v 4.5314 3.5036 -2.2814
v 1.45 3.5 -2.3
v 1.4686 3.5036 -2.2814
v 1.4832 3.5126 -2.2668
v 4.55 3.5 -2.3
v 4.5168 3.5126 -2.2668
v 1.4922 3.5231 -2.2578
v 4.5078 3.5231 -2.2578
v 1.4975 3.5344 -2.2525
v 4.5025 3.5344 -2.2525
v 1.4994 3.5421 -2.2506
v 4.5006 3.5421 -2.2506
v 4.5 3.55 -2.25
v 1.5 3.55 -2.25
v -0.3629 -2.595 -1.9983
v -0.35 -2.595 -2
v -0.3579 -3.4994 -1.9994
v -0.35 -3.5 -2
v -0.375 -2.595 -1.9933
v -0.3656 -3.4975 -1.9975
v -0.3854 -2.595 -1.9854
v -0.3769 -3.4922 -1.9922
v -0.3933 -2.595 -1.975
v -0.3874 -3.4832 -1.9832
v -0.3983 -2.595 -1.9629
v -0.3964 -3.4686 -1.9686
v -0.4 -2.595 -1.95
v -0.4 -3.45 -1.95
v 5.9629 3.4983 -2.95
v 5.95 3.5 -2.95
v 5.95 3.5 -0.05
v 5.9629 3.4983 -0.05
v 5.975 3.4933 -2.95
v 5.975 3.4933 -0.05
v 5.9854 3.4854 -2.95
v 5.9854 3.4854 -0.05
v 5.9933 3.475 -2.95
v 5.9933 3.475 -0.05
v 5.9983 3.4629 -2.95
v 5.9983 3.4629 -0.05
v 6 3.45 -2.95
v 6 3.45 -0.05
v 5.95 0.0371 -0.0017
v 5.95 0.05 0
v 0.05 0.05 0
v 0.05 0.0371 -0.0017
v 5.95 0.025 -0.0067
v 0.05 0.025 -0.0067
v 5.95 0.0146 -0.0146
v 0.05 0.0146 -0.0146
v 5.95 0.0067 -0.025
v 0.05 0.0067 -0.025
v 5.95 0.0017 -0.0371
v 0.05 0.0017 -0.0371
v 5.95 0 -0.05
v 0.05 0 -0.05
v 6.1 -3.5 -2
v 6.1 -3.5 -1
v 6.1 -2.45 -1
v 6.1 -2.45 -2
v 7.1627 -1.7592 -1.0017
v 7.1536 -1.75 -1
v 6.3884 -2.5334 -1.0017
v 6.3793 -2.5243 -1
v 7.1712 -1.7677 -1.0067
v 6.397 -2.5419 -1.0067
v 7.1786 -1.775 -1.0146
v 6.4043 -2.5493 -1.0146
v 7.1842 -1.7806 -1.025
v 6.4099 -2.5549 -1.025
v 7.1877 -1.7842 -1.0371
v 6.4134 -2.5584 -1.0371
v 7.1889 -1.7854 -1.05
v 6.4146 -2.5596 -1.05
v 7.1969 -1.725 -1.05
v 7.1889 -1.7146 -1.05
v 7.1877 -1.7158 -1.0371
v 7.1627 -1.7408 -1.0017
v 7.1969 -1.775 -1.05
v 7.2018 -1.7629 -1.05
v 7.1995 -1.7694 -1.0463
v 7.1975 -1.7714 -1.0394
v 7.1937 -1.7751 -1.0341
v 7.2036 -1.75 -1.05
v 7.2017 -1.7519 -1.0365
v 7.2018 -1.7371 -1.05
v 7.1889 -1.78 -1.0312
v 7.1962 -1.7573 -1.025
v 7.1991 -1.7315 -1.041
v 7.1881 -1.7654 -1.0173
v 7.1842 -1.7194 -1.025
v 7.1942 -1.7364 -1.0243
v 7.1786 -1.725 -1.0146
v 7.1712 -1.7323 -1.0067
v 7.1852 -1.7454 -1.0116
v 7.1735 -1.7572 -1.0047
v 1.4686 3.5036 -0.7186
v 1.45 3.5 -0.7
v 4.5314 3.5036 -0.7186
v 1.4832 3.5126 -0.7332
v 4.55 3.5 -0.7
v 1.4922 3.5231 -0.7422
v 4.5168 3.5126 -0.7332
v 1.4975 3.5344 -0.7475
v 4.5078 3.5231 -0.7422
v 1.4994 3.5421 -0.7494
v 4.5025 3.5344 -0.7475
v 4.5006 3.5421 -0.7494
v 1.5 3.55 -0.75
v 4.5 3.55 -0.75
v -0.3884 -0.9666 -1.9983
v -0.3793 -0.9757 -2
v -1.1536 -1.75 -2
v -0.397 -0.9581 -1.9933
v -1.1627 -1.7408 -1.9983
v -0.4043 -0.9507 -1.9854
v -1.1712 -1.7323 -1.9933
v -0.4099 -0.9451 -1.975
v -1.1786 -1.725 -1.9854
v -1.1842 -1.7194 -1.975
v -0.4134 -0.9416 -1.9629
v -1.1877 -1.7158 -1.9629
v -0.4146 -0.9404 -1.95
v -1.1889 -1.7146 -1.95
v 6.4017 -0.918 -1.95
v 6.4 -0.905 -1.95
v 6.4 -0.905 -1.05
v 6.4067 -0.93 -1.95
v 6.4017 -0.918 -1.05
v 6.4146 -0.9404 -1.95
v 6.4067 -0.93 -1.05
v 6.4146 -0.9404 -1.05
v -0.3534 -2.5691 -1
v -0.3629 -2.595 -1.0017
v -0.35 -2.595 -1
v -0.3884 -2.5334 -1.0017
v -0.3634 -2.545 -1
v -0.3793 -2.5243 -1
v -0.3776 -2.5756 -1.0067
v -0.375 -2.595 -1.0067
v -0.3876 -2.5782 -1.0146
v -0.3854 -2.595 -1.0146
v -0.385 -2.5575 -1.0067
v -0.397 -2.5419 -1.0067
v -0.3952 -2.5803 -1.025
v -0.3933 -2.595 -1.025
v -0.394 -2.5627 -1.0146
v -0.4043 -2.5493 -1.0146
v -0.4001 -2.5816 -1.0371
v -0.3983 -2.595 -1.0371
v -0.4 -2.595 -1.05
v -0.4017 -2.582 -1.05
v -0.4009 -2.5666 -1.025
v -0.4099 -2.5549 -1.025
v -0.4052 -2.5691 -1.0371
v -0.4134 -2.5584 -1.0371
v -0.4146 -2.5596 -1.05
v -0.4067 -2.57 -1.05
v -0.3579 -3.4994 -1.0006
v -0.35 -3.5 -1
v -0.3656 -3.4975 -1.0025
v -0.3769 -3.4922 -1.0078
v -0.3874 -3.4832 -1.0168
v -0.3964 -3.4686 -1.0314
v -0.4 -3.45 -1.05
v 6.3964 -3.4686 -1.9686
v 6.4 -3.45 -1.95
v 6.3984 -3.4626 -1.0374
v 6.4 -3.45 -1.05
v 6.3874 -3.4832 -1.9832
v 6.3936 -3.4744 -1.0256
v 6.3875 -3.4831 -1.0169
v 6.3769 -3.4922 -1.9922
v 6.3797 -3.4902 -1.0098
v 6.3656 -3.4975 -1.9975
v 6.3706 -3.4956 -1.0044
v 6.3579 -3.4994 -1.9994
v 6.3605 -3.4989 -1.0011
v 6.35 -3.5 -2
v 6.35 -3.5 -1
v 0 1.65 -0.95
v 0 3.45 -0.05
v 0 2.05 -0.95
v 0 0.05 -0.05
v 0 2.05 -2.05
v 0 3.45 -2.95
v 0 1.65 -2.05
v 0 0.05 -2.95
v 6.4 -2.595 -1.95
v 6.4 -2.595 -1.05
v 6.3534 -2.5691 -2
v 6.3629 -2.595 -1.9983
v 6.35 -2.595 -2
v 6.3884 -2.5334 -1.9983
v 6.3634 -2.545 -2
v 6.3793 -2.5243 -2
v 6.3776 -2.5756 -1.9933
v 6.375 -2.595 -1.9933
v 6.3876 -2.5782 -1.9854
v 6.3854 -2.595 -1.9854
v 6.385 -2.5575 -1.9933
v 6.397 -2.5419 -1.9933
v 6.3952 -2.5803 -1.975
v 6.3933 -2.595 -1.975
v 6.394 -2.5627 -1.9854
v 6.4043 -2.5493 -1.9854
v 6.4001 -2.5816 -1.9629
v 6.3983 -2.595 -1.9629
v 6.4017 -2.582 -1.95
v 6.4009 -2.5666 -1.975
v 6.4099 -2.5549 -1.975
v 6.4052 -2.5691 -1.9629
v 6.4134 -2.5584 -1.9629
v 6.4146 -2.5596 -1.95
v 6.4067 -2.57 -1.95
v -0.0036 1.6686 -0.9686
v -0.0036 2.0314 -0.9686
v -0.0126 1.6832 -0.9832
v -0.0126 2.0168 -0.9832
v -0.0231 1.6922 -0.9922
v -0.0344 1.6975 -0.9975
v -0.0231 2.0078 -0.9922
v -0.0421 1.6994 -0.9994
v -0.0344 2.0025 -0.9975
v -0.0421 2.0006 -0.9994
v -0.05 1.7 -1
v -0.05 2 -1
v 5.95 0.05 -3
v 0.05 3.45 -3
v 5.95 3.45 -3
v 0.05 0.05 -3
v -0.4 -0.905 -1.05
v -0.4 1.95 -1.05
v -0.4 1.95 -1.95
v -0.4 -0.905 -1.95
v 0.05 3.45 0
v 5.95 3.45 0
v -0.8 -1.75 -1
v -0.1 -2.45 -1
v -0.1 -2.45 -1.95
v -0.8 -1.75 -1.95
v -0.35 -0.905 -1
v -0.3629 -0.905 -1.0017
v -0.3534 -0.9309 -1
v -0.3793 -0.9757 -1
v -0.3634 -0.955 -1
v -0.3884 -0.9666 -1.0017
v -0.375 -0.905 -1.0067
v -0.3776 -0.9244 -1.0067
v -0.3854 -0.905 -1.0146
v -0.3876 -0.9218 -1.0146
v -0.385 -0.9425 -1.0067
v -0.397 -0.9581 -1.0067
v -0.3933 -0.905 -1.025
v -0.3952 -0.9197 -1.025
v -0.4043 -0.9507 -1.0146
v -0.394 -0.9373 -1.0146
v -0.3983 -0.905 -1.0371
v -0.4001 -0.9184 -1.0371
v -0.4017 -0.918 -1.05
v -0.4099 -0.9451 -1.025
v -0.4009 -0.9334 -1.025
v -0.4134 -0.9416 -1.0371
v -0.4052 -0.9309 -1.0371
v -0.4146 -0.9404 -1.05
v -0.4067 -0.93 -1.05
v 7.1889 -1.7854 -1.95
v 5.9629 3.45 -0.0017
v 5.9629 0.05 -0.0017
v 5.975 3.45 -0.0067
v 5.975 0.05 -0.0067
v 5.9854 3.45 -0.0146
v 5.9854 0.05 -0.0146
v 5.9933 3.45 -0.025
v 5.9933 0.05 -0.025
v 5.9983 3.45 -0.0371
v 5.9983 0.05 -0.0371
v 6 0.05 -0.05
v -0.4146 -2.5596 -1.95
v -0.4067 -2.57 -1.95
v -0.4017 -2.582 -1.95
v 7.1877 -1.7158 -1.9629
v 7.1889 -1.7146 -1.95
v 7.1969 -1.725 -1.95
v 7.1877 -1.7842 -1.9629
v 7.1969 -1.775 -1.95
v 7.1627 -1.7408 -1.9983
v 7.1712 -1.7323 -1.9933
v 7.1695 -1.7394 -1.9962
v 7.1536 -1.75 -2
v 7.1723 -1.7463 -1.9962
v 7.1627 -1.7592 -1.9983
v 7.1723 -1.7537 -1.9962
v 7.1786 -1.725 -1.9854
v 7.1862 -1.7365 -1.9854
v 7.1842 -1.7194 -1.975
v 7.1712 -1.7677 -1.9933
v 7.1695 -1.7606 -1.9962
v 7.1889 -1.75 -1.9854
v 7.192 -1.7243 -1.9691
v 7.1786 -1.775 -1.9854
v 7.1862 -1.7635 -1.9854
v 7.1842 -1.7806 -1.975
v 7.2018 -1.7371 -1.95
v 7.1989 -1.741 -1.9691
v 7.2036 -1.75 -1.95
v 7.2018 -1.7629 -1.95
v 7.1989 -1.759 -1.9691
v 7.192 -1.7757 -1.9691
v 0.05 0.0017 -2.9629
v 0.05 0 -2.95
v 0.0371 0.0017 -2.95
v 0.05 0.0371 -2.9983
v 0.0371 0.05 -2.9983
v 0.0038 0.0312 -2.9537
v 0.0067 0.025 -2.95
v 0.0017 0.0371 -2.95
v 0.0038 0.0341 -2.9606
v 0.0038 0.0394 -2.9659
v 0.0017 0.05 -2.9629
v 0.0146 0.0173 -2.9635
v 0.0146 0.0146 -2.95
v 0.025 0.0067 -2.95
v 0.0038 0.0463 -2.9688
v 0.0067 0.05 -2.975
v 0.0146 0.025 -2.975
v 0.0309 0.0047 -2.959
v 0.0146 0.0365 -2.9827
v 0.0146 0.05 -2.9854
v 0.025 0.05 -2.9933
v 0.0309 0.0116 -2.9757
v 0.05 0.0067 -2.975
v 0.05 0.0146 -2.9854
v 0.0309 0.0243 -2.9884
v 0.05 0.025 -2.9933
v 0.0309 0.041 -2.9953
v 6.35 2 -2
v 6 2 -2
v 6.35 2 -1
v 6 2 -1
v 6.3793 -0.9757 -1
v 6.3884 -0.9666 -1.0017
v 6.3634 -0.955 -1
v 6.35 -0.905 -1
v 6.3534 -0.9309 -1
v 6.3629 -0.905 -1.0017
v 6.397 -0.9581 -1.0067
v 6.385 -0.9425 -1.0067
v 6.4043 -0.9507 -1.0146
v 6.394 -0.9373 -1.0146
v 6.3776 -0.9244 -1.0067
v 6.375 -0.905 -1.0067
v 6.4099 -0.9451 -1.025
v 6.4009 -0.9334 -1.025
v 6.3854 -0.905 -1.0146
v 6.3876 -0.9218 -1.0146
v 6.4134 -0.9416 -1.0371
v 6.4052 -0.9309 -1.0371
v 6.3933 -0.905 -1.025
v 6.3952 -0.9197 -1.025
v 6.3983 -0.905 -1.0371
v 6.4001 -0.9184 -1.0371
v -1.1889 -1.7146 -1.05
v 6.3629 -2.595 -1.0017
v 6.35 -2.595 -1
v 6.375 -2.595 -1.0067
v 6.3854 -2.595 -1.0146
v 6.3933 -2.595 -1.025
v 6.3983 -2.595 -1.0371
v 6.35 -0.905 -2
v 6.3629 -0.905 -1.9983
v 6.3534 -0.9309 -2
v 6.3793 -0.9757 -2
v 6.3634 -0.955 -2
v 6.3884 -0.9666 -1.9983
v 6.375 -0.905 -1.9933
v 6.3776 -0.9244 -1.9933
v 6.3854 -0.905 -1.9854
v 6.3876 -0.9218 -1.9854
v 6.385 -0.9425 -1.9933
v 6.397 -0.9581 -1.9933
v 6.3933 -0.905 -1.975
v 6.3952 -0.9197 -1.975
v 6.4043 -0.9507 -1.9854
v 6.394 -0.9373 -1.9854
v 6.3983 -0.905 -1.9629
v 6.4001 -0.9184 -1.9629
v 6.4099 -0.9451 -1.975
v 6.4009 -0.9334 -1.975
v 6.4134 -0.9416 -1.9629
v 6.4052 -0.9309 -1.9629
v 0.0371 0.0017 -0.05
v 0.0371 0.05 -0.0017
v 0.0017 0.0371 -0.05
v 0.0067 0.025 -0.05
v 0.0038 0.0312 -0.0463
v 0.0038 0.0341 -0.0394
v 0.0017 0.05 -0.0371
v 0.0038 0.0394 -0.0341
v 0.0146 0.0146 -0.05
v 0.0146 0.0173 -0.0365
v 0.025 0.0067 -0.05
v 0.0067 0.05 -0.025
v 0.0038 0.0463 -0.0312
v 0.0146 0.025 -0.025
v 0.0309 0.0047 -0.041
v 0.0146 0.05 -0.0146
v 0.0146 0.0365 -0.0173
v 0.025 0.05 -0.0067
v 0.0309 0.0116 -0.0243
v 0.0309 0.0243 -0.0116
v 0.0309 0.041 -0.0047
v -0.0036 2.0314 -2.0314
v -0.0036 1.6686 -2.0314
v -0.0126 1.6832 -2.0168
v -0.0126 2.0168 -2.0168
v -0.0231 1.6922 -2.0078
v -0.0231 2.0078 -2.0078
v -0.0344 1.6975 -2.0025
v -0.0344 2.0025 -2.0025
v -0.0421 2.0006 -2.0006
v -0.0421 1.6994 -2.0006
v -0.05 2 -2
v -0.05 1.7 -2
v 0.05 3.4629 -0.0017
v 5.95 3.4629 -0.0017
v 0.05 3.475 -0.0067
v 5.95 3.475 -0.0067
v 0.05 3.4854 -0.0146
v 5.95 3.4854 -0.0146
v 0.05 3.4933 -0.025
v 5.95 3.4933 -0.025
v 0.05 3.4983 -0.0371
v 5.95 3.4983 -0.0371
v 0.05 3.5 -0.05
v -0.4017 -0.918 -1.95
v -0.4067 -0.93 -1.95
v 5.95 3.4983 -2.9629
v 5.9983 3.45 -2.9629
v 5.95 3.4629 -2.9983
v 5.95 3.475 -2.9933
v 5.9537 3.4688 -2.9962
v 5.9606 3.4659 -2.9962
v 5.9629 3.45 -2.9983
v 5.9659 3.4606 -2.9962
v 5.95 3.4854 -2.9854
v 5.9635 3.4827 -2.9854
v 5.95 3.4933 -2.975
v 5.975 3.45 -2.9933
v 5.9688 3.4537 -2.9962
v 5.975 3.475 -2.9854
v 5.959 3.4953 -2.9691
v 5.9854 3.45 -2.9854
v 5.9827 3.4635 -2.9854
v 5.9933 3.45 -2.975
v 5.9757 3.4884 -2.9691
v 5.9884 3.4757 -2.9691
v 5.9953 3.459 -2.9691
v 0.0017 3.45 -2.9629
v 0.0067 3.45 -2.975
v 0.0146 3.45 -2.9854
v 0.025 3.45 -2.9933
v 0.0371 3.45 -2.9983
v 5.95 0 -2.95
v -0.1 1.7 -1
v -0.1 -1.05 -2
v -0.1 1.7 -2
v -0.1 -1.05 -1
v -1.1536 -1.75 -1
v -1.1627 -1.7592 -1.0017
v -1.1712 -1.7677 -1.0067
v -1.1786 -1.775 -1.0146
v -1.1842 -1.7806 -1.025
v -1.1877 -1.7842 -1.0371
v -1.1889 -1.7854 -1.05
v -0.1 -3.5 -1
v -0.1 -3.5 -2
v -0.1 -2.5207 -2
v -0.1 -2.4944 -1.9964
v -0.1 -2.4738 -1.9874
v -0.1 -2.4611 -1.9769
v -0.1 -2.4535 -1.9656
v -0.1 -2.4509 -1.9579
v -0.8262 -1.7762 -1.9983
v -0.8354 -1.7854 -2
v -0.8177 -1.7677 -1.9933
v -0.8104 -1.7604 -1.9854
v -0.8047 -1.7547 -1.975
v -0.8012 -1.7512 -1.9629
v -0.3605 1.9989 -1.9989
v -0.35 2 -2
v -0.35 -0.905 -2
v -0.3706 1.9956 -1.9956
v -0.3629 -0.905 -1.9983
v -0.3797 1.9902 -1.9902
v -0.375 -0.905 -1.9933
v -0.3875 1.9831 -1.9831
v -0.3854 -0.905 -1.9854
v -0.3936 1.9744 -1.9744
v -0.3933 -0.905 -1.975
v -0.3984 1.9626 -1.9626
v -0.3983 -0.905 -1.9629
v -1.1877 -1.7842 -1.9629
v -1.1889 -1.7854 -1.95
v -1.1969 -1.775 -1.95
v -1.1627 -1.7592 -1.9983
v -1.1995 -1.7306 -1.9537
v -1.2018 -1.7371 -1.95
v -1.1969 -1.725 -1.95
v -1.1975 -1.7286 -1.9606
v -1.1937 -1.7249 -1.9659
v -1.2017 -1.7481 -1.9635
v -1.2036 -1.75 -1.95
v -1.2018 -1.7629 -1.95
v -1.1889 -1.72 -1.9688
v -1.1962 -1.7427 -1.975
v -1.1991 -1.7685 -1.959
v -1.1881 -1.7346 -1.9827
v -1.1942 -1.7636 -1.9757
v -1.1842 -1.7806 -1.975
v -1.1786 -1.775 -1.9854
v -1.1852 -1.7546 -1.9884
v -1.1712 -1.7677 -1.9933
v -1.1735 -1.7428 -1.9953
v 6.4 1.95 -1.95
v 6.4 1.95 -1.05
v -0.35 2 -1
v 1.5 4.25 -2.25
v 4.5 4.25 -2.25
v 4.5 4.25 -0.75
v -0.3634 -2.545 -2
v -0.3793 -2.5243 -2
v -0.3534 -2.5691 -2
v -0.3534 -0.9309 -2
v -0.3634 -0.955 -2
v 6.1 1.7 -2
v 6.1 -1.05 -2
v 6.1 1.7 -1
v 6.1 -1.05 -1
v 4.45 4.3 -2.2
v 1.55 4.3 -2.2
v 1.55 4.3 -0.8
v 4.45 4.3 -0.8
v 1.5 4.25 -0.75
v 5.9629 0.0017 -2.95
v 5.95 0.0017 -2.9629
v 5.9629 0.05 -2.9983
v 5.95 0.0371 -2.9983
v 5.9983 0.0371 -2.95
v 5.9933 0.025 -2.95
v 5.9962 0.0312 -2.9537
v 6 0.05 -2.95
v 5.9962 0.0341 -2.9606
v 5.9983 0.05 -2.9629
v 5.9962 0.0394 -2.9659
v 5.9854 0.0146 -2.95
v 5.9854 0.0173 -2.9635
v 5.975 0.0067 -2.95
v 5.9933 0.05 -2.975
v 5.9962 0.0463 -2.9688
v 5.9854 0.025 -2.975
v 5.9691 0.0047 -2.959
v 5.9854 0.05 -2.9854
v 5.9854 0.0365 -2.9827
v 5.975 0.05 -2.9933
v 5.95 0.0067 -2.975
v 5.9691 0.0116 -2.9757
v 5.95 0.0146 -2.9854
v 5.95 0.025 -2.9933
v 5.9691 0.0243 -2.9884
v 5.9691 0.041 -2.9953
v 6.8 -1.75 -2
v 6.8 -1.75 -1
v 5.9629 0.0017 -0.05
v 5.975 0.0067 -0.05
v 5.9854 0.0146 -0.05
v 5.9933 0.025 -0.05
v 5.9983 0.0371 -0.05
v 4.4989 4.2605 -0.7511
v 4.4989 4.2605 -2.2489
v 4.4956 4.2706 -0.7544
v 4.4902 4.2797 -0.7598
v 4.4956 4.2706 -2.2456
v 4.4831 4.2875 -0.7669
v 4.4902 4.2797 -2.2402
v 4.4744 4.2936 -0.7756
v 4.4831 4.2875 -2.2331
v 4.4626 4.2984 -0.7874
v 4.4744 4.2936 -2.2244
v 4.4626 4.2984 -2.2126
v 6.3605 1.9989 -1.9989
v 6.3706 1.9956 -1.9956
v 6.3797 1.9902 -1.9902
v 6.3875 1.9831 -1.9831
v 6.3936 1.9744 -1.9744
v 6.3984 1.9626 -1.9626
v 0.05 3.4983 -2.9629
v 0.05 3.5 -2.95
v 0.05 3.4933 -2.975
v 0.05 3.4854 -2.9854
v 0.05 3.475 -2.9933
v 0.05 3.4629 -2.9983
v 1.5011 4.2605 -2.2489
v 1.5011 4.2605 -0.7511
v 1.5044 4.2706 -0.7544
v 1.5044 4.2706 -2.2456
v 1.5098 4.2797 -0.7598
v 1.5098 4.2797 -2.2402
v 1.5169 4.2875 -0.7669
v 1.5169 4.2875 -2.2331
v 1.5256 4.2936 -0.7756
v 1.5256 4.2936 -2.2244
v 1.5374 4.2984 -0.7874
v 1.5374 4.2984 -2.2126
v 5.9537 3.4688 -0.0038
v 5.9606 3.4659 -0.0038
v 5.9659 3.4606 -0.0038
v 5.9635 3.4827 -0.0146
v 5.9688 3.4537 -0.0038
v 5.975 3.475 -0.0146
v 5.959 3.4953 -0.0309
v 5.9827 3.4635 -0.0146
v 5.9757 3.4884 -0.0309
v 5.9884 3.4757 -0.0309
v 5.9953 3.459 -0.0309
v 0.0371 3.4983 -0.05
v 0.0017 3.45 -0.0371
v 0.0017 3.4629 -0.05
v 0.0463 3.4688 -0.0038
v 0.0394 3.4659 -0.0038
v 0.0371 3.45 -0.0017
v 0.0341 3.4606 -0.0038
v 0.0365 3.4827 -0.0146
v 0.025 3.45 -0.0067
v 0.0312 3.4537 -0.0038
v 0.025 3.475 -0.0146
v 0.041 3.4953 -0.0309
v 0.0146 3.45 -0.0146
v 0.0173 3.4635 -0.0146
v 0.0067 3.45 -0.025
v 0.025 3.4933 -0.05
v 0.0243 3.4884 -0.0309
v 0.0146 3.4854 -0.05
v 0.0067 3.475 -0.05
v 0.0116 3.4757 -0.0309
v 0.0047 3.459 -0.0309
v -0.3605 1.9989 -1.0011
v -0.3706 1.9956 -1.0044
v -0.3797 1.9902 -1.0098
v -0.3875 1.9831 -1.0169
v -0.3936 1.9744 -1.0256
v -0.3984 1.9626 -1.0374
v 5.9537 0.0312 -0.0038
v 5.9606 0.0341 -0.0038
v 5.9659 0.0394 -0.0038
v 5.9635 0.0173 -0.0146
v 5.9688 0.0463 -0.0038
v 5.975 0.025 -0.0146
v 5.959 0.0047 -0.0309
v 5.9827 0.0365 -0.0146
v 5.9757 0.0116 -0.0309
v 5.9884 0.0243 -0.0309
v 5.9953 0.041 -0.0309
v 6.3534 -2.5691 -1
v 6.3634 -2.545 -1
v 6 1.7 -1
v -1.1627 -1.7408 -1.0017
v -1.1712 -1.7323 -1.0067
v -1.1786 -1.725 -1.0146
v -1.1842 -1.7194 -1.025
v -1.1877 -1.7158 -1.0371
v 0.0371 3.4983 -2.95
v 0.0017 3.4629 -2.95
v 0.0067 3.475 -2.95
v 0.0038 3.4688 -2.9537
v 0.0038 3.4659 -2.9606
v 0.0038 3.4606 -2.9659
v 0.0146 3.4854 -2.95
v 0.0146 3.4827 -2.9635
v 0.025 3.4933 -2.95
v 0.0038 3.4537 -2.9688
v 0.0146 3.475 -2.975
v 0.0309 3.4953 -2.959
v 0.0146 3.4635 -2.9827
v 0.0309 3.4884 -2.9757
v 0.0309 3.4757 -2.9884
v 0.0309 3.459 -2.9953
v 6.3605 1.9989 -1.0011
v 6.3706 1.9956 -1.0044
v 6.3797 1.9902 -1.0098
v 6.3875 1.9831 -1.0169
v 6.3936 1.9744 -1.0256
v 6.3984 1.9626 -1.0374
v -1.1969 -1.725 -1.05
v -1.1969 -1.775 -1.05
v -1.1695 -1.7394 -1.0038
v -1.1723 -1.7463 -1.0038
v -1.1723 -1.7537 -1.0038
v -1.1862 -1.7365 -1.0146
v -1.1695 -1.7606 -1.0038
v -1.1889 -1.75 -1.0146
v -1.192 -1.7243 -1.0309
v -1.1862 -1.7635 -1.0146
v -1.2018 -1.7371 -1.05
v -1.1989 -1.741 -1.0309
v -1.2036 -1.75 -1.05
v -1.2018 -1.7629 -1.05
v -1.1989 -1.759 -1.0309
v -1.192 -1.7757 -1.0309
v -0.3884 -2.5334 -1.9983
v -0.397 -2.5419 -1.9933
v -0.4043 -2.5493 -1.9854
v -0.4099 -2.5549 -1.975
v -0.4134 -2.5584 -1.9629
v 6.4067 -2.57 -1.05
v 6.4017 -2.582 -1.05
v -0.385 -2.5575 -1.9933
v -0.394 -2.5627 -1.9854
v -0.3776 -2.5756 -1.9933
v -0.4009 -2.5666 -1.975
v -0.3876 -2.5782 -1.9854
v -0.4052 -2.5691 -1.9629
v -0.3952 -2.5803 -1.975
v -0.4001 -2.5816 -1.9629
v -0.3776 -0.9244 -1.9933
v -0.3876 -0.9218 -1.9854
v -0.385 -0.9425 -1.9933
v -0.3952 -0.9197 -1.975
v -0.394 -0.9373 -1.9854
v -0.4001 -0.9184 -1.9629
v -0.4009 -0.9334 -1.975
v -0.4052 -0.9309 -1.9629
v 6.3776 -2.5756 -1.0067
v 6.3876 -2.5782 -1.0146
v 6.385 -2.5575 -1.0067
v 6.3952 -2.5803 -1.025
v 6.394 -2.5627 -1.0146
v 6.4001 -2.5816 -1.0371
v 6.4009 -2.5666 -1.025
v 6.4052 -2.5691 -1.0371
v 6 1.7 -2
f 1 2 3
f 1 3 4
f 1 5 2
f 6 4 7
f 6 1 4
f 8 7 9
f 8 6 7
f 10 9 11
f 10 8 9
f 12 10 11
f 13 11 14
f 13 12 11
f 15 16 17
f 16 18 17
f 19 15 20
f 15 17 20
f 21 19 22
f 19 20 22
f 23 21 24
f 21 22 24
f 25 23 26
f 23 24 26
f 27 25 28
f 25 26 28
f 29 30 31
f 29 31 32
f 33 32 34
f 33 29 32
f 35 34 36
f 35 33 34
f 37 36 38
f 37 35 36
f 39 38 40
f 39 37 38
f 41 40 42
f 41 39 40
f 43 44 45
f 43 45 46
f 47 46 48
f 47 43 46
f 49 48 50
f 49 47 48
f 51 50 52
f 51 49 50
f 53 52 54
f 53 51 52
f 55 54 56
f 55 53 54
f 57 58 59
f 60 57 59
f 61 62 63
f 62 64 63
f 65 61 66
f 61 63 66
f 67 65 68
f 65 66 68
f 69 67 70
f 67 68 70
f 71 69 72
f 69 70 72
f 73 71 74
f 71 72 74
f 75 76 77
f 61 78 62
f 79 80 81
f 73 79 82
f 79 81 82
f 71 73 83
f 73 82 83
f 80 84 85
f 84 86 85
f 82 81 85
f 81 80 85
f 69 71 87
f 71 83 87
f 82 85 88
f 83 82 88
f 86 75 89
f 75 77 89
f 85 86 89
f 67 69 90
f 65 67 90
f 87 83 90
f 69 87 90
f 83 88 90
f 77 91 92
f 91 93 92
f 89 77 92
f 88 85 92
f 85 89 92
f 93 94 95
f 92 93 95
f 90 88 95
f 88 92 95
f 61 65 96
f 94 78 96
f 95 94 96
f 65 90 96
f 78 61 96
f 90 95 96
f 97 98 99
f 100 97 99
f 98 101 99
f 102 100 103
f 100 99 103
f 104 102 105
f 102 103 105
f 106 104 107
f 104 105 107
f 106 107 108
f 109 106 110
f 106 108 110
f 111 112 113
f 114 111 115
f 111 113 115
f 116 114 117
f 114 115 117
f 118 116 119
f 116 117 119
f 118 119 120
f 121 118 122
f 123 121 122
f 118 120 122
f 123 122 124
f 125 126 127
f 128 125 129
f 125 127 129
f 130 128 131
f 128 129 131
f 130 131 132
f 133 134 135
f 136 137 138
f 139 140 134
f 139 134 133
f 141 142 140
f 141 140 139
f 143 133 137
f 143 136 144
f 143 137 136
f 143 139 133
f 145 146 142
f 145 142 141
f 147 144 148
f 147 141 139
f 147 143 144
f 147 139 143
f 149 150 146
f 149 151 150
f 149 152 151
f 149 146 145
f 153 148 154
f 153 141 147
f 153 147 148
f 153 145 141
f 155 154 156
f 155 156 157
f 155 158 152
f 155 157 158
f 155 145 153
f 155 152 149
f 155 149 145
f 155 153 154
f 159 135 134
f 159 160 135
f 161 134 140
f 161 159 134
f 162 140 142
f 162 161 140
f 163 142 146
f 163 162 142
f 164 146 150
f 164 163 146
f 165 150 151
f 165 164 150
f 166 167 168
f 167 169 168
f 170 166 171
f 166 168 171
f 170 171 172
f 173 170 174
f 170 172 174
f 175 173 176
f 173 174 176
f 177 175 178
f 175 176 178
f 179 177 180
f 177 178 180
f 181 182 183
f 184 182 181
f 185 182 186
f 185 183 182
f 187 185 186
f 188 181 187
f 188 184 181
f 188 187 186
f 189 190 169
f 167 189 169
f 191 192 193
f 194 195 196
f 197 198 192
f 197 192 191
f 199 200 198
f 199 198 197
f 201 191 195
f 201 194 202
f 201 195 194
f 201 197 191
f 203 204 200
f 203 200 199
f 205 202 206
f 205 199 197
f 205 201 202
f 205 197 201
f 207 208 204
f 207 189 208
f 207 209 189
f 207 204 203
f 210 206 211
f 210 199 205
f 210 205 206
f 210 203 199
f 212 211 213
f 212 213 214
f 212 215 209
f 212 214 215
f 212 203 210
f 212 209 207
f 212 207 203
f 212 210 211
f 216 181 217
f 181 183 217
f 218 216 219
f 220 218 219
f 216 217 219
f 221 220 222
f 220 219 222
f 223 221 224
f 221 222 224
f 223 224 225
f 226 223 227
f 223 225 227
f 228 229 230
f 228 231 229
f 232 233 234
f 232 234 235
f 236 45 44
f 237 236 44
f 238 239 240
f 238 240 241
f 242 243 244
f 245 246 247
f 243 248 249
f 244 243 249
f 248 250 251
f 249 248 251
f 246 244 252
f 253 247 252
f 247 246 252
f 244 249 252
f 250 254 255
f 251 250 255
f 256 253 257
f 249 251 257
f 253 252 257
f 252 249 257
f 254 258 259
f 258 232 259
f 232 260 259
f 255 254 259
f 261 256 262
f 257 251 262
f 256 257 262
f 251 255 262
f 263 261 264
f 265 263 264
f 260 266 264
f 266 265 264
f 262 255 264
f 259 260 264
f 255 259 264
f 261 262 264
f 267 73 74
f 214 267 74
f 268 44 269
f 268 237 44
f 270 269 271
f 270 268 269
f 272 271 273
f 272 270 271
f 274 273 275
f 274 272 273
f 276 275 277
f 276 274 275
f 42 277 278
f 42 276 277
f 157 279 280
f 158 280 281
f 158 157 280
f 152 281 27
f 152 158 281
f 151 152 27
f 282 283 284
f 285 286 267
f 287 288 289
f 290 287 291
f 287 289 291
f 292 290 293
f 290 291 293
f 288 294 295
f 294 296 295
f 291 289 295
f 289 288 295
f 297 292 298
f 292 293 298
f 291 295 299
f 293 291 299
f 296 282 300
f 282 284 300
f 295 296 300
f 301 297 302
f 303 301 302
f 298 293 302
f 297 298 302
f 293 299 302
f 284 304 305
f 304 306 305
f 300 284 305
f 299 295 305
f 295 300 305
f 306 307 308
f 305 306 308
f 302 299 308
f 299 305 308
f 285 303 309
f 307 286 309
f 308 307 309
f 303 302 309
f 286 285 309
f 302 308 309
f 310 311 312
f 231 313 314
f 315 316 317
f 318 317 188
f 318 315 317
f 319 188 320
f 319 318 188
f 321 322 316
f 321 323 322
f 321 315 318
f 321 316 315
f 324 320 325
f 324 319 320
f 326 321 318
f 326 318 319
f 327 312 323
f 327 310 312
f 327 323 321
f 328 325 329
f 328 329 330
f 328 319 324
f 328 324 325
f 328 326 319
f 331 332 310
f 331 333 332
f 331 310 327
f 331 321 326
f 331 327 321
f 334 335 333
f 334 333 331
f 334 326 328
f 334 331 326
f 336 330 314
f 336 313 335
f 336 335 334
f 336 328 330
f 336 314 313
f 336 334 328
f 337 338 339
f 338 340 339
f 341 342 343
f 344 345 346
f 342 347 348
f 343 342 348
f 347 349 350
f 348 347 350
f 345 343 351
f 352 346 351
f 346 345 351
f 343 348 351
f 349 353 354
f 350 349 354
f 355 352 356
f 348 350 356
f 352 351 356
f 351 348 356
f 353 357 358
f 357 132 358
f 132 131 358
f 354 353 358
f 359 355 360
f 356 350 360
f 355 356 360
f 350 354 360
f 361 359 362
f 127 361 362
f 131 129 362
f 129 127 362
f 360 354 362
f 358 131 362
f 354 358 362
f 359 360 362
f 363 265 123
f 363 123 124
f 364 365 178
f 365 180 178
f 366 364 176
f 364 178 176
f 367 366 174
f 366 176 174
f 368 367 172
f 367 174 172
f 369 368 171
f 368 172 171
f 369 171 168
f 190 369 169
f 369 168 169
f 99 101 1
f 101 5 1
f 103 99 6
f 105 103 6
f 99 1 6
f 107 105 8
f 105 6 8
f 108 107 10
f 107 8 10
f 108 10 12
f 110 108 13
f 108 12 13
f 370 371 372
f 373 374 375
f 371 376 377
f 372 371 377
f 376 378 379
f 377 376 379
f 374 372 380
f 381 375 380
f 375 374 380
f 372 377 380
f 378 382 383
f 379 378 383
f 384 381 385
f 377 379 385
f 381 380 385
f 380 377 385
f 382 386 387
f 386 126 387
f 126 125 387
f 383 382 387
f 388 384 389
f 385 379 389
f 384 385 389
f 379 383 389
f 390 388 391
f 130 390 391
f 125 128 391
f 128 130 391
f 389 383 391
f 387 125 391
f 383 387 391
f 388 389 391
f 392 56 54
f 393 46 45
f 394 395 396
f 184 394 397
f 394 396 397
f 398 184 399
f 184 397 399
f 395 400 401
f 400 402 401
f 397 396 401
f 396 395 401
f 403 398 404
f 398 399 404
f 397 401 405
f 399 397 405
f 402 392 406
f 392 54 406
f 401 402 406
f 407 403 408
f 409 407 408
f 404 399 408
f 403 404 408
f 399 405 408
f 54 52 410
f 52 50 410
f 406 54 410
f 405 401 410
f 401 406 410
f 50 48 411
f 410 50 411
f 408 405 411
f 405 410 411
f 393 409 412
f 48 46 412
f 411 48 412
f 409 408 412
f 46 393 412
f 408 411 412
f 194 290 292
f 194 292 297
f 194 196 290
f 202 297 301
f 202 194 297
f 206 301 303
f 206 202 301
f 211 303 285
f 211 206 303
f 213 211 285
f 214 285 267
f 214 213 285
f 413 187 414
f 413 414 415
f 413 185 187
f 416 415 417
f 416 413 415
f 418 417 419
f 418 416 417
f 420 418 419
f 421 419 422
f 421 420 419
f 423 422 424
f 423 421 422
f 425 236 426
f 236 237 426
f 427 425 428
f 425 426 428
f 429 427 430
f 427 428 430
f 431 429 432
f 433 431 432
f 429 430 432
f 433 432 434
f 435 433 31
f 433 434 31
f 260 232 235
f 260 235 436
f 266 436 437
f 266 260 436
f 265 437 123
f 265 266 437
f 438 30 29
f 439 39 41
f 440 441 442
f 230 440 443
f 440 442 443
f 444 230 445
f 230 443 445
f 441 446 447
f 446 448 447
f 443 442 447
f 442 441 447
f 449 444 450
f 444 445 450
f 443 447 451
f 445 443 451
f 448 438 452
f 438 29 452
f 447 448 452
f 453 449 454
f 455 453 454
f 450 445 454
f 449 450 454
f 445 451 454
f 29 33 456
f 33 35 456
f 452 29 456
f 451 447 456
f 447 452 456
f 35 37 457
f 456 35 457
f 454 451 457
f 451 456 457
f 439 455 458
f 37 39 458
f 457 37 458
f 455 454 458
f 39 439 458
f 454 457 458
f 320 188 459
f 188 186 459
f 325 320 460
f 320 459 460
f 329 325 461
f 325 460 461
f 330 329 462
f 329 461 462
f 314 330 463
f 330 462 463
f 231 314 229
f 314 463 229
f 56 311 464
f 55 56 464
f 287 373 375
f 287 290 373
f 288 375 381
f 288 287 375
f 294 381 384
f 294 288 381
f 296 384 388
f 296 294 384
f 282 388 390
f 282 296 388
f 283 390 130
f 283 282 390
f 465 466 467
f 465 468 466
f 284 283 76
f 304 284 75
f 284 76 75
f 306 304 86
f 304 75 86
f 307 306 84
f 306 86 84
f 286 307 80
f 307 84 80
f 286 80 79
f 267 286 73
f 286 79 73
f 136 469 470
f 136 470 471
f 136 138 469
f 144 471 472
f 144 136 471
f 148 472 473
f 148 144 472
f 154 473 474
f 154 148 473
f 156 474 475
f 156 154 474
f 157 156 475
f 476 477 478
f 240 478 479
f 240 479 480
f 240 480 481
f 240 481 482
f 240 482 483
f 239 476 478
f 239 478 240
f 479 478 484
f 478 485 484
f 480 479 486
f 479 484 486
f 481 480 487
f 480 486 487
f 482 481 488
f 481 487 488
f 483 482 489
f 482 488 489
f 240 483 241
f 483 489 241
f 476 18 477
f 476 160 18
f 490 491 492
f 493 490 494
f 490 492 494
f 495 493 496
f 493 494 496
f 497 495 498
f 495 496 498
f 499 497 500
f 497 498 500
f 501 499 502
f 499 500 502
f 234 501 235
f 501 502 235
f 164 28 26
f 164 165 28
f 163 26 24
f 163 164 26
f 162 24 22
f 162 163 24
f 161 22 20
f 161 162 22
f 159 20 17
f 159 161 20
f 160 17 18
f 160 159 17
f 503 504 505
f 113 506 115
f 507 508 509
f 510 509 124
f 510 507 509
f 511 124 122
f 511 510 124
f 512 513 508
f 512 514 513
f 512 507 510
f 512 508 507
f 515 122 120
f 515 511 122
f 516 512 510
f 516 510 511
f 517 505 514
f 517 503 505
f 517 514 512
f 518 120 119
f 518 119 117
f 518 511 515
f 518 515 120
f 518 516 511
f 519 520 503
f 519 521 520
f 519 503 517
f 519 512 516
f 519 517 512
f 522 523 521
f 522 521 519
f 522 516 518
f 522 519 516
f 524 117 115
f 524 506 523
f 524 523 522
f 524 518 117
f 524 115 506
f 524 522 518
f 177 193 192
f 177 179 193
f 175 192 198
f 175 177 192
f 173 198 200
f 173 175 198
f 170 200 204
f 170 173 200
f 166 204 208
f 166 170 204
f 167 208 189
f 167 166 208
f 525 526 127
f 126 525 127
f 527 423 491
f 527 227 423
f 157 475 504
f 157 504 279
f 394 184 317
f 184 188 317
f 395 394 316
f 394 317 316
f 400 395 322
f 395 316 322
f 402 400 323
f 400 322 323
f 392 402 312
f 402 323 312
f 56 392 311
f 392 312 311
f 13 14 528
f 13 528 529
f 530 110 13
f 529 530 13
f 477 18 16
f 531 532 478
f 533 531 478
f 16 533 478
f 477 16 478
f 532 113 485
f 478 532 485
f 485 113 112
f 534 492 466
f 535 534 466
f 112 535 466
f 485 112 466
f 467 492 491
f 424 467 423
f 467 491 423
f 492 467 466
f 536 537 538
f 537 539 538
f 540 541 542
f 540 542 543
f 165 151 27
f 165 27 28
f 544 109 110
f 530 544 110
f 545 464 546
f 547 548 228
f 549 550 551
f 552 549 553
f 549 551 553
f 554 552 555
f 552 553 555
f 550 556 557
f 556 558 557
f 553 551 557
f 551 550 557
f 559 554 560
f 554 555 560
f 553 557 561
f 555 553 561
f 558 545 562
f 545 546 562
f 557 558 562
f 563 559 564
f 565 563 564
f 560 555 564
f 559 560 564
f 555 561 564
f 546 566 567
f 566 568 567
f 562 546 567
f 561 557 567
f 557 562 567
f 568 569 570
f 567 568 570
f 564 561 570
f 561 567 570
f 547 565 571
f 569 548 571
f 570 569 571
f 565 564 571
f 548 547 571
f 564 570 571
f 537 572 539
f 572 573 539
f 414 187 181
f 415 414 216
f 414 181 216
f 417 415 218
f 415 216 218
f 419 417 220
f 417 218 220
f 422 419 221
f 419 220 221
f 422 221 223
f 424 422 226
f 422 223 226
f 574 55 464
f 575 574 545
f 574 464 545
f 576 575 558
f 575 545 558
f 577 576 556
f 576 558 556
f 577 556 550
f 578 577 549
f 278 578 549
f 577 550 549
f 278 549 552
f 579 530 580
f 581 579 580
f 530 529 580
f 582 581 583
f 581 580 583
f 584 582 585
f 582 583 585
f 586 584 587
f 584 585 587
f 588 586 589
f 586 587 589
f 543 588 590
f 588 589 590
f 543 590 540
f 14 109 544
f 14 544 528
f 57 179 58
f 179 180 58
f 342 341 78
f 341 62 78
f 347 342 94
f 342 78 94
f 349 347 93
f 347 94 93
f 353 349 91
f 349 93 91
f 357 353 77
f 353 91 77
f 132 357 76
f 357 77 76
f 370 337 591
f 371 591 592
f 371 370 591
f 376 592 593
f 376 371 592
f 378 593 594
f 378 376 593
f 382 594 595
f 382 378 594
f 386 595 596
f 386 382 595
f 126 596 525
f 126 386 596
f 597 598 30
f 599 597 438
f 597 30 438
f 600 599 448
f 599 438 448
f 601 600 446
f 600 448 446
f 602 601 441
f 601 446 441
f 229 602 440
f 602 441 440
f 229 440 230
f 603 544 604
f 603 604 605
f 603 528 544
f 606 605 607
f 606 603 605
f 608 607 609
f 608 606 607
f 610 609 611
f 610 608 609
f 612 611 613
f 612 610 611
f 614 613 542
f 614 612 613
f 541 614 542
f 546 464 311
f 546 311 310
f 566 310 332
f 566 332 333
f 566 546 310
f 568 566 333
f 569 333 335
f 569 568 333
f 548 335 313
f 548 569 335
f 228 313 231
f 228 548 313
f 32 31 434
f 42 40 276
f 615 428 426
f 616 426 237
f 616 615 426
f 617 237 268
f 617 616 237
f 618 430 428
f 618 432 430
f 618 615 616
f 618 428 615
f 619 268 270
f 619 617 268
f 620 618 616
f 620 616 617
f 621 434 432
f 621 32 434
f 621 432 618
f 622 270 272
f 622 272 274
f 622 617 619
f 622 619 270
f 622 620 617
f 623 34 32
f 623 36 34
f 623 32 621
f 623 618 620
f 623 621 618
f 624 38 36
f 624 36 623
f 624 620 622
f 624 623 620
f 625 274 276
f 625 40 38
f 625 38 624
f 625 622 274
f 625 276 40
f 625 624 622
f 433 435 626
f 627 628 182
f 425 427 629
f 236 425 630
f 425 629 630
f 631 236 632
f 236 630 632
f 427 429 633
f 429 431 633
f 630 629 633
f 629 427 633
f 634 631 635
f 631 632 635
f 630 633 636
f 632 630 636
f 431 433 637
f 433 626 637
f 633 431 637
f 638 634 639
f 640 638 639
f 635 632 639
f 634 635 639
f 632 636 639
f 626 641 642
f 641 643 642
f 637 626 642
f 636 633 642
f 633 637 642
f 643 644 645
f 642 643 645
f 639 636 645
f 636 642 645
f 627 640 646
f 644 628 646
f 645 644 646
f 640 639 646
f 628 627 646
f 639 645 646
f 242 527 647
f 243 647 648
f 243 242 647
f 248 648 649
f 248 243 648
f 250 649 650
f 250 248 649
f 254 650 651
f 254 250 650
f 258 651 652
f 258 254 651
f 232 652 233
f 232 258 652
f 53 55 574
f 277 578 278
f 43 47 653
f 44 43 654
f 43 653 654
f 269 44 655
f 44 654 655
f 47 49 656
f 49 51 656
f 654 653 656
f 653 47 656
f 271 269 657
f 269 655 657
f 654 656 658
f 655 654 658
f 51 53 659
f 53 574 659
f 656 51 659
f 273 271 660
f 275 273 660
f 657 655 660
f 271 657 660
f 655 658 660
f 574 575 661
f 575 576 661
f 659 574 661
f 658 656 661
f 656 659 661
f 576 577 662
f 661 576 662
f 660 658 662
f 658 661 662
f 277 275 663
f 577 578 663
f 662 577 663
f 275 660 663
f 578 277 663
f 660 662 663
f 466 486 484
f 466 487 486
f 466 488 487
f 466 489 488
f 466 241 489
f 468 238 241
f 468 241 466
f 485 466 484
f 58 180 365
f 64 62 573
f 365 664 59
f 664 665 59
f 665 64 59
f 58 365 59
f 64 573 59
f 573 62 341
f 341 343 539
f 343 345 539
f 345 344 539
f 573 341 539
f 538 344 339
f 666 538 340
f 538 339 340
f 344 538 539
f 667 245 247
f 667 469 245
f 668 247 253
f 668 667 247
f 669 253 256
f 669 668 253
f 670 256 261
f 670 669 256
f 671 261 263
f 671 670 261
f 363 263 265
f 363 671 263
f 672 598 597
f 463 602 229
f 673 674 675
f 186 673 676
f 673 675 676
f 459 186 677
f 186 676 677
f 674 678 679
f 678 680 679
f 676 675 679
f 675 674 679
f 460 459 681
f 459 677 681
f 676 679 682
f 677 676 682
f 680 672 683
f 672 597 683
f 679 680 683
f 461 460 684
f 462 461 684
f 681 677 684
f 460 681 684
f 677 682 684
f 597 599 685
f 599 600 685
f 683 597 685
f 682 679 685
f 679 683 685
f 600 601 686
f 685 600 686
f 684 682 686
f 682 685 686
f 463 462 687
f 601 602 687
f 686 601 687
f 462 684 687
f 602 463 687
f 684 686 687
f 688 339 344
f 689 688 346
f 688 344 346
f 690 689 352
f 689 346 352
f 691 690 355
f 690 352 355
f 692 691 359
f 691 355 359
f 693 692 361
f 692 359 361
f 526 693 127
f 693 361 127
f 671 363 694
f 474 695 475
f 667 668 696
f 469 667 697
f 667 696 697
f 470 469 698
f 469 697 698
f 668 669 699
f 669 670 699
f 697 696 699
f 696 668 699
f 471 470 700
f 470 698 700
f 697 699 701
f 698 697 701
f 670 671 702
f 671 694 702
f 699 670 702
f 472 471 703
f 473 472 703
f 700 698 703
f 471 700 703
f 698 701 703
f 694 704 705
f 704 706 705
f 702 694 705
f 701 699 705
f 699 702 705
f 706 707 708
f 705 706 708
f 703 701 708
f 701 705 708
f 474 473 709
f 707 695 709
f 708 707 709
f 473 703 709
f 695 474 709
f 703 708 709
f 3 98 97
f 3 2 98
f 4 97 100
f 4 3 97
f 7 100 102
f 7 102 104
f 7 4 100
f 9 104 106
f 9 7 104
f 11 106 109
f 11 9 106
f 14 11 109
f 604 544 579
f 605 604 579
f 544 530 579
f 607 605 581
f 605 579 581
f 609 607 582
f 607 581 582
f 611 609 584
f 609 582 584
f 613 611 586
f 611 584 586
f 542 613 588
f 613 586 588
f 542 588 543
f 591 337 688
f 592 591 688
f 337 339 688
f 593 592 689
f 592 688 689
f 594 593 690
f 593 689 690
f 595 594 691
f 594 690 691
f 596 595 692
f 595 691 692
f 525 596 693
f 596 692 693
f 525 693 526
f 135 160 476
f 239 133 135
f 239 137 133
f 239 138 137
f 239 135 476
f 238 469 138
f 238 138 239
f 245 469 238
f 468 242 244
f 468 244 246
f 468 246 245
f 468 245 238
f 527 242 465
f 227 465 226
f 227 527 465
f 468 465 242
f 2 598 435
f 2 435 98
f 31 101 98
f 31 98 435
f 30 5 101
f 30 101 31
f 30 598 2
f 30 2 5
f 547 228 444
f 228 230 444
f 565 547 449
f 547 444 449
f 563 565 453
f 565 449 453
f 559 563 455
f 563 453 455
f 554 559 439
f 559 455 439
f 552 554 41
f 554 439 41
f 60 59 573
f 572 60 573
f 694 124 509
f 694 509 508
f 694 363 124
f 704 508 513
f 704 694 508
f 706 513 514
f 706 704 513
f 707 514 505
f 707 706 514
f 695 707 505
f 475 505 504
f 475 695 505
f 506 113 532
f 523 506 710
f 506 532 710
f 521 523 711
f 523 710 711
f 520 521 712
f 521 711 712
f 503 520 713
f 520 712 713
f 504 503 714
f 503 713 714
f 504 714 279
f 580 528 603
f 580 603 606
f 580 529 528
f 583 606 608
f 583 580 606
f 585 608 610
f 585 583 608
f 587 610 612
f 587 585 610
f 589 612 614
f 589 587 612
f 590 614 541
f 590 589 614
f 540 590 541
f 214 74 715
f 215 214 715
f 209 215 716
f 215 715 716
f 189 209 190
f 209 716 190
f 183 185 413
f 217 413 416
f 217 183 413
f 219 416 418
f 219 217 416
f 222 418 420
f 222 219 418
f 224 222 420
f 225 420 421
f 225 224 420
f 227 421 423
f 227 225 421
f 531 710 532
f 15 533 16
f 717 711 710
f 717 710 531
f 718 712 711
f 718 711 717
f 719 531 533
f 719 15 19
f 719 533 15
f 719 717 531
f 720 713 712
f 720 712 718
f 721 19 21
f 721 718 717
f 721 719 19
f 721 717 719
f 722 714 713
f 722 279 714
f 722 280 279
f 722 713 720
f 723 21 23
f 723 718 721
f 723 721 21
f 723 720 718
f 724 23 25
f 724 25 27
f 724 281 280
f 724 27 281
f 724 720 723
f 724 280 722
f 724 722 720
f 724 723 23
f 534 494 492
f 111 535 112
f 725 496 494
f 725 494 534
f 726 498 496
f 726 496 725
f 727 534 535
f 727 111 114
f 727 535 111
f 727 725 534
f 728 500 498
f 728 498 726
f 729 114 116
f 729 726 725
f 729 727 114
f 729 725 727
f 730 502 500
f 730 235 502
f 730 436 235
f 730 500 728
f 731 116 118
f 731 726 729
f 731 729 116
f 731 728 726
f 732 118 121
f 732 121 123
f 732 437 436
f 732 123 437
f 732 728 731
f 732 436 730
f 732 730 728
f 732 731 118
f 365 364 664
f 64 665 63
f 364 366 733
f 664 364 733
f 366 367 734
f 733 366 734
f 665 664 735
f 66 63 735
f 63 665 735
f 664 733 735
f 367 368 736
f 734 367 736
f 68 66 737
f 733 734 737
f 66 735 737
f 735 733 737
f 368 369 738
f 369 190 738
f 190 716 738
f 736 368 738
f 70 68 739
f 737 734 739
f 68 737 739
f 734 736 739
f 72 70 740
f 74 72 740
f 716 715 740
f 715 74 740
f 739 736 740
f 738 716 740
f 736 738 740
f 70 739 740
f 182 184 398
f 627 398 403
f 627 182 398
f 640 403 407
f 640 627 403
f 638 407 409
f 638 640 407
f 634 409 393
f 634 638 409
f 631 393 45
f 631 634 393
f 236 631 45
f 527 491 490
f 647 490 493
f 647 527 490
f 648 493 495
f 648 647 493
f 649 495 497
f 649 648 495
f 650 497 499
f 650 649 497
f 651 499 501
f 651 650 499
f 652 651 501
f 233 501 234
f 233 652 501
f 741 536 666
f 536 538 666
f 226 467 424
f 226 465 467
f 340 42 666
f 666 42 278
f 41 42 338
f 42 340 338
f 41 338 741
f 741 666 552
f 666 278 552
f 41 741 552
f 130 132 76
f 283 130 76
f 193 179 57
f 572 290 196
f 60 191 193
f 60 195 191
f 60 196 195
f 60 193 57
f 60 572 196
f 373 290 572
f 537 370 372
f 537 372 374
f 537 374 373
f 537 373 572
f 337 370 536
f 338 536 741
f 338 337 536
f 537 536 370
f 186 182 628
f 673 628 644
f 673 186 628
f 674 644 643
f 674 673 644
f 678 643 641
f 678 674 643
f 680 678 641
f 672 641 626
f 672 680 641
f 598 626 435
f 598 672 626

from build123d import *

# Parameters (mm, degrees)
SKETCH1_W           = 6
SKETCH1_H           = 3
BOSS_EXTRUDE1_DEPTH = 3.5
BOSS_EXTRUDE2_DEPTH = 0.5
SKETCH3_W           = 3
SKETCH3_H           = 1.5
BOSS_EXTRUDE3_DEPTH = 0.8
FILLET1_R           = 0.05


with BuildPart() as part:
    # Sketch1 → Boss-Extrude1 (new body)
    with BuildSketch(Plane(origin=(0, 0, 0), x_dir=(1, 0, 0), z_dir=(0, 1, 0))):
        with Locations((3, 1.5)):
            Rectangle(SKETCH1_W, SKETCH1_H)
    extrude(amount=BOSS_EXTRUDE1_DEPTH)

    # Sketch2 → Boss-Extrude2 (add, symmetric)
    with BuildSketch(Plane.XY.offset(-1.5)):
        Polygon((-0.1, 1.7), (0, 1.7), (0, 2), (-0.4, 2), (-0.4, -0.925735931), (-1.224264069, -1.75), (-0.4, -2.574264069), (-0.4, -3.5), (-0.1, -3.5), (-0.1, -2.45), (-0.8, -1.75), (-0.1, -1.05), (-0.1, -0.722730952), align=None)
    boss_extrude2 = extrude(amount=BOSS_EXTRUDE2_DEPTH, both=True)

    # Mirror1: Boss-Extrude2 across plane
    add(boss_extrude2.mirror(Plane.ZY.offset(-3)))

    # Sketch3 → Boss-Extrude3 (add)
    with BuildSketch(Plane(origin=(0, 3.5, 0), x_dir=(1, 0, 0), z_dir=(0, 1, 0))):
        with Locations((3, 1.5)):
            Rectangle(SKETCH3_W, SKETCH3_H)
    extrude(amount=BOSS_EXTRUDE3_DEPTH)

    # Fillet1
    fillet1_edges = [part.edges().sort_by_distance(p)[0] for p in [
        (6, 3.5, -1.5),
        (3, 3.5, -3),
        (-0.4, -3.5, -1.5),
        (-0.4, -3.037132034, -2),
        (-0.4, -2.574264069, -1.5),
        (-0.812132034, -2.162132034, -2),
        (-1.224264069, -1.75, -1.5),
        (-0.812132034, -1.337867966, -2),
        (-0.4, -0.925735931, -1.5),
        (-0.4, 0.537132034, -2),
        (-0.4, 2, -1.5),
        (0, 2, -1.5),
        (0, 1.85, -1),
        (0, 1.7, -1.5),
        (0, 1.85, -2),
        (-0.45, -2.1, -2),
        (-0.4, -3.037132034, -1),
        (-0.4, 0.537132034, -1),
        (-0.812132034, -1.337867966, -1),
        (-0.812132034, -2.162132034, -1),
        (0, 3.5, -1.5),
        (3, 0, -3),
        (6.4, -2.574264069, -1.5),
        (6.4, -3.037132034, -1),
        (6.4, -3.5, -1.5),
        (6.4, 2, -1.5),
        (6.4, 0.537132034, -1),
        (6, 0, -1.5),
        (6.4, -0.925735931, -1.5),
        (6.812132034, -1.337867966, -1),
        (7.224264069, -1.75, -1.5),
        (6.812132034, -2.162132034, -1),
        (6.4, -3.037132034, -2),
        (6.4, 0.537132034, -2),
        (6.812132034, -1.337867966, -2),
        (6.812132034, -2.162132034, -2),
        (3, 0, 0),
        (0, 0, -1.5),
        (3, 3.5, 0),
        (0, 1.75, -3),
        (4.5, 3.5, -1.5),
        (3, 3.5, -2.25),
        (6, 1.75, -3),
        (1.5, 3.5, -1.5),
        (3, 3.5, -0.75),
        (6, 1.75, 0),
        (4.5, 4.3, -1.5),
        (3, 4.3, -2.25),
        (1.5, 4.3, -1.5),
        (3, 4.3, -0.75),
        (0, 1.75, 0),
    ]]
    fillet(fillet1_edges, radius=FILLET1_R)


solid = part.part
